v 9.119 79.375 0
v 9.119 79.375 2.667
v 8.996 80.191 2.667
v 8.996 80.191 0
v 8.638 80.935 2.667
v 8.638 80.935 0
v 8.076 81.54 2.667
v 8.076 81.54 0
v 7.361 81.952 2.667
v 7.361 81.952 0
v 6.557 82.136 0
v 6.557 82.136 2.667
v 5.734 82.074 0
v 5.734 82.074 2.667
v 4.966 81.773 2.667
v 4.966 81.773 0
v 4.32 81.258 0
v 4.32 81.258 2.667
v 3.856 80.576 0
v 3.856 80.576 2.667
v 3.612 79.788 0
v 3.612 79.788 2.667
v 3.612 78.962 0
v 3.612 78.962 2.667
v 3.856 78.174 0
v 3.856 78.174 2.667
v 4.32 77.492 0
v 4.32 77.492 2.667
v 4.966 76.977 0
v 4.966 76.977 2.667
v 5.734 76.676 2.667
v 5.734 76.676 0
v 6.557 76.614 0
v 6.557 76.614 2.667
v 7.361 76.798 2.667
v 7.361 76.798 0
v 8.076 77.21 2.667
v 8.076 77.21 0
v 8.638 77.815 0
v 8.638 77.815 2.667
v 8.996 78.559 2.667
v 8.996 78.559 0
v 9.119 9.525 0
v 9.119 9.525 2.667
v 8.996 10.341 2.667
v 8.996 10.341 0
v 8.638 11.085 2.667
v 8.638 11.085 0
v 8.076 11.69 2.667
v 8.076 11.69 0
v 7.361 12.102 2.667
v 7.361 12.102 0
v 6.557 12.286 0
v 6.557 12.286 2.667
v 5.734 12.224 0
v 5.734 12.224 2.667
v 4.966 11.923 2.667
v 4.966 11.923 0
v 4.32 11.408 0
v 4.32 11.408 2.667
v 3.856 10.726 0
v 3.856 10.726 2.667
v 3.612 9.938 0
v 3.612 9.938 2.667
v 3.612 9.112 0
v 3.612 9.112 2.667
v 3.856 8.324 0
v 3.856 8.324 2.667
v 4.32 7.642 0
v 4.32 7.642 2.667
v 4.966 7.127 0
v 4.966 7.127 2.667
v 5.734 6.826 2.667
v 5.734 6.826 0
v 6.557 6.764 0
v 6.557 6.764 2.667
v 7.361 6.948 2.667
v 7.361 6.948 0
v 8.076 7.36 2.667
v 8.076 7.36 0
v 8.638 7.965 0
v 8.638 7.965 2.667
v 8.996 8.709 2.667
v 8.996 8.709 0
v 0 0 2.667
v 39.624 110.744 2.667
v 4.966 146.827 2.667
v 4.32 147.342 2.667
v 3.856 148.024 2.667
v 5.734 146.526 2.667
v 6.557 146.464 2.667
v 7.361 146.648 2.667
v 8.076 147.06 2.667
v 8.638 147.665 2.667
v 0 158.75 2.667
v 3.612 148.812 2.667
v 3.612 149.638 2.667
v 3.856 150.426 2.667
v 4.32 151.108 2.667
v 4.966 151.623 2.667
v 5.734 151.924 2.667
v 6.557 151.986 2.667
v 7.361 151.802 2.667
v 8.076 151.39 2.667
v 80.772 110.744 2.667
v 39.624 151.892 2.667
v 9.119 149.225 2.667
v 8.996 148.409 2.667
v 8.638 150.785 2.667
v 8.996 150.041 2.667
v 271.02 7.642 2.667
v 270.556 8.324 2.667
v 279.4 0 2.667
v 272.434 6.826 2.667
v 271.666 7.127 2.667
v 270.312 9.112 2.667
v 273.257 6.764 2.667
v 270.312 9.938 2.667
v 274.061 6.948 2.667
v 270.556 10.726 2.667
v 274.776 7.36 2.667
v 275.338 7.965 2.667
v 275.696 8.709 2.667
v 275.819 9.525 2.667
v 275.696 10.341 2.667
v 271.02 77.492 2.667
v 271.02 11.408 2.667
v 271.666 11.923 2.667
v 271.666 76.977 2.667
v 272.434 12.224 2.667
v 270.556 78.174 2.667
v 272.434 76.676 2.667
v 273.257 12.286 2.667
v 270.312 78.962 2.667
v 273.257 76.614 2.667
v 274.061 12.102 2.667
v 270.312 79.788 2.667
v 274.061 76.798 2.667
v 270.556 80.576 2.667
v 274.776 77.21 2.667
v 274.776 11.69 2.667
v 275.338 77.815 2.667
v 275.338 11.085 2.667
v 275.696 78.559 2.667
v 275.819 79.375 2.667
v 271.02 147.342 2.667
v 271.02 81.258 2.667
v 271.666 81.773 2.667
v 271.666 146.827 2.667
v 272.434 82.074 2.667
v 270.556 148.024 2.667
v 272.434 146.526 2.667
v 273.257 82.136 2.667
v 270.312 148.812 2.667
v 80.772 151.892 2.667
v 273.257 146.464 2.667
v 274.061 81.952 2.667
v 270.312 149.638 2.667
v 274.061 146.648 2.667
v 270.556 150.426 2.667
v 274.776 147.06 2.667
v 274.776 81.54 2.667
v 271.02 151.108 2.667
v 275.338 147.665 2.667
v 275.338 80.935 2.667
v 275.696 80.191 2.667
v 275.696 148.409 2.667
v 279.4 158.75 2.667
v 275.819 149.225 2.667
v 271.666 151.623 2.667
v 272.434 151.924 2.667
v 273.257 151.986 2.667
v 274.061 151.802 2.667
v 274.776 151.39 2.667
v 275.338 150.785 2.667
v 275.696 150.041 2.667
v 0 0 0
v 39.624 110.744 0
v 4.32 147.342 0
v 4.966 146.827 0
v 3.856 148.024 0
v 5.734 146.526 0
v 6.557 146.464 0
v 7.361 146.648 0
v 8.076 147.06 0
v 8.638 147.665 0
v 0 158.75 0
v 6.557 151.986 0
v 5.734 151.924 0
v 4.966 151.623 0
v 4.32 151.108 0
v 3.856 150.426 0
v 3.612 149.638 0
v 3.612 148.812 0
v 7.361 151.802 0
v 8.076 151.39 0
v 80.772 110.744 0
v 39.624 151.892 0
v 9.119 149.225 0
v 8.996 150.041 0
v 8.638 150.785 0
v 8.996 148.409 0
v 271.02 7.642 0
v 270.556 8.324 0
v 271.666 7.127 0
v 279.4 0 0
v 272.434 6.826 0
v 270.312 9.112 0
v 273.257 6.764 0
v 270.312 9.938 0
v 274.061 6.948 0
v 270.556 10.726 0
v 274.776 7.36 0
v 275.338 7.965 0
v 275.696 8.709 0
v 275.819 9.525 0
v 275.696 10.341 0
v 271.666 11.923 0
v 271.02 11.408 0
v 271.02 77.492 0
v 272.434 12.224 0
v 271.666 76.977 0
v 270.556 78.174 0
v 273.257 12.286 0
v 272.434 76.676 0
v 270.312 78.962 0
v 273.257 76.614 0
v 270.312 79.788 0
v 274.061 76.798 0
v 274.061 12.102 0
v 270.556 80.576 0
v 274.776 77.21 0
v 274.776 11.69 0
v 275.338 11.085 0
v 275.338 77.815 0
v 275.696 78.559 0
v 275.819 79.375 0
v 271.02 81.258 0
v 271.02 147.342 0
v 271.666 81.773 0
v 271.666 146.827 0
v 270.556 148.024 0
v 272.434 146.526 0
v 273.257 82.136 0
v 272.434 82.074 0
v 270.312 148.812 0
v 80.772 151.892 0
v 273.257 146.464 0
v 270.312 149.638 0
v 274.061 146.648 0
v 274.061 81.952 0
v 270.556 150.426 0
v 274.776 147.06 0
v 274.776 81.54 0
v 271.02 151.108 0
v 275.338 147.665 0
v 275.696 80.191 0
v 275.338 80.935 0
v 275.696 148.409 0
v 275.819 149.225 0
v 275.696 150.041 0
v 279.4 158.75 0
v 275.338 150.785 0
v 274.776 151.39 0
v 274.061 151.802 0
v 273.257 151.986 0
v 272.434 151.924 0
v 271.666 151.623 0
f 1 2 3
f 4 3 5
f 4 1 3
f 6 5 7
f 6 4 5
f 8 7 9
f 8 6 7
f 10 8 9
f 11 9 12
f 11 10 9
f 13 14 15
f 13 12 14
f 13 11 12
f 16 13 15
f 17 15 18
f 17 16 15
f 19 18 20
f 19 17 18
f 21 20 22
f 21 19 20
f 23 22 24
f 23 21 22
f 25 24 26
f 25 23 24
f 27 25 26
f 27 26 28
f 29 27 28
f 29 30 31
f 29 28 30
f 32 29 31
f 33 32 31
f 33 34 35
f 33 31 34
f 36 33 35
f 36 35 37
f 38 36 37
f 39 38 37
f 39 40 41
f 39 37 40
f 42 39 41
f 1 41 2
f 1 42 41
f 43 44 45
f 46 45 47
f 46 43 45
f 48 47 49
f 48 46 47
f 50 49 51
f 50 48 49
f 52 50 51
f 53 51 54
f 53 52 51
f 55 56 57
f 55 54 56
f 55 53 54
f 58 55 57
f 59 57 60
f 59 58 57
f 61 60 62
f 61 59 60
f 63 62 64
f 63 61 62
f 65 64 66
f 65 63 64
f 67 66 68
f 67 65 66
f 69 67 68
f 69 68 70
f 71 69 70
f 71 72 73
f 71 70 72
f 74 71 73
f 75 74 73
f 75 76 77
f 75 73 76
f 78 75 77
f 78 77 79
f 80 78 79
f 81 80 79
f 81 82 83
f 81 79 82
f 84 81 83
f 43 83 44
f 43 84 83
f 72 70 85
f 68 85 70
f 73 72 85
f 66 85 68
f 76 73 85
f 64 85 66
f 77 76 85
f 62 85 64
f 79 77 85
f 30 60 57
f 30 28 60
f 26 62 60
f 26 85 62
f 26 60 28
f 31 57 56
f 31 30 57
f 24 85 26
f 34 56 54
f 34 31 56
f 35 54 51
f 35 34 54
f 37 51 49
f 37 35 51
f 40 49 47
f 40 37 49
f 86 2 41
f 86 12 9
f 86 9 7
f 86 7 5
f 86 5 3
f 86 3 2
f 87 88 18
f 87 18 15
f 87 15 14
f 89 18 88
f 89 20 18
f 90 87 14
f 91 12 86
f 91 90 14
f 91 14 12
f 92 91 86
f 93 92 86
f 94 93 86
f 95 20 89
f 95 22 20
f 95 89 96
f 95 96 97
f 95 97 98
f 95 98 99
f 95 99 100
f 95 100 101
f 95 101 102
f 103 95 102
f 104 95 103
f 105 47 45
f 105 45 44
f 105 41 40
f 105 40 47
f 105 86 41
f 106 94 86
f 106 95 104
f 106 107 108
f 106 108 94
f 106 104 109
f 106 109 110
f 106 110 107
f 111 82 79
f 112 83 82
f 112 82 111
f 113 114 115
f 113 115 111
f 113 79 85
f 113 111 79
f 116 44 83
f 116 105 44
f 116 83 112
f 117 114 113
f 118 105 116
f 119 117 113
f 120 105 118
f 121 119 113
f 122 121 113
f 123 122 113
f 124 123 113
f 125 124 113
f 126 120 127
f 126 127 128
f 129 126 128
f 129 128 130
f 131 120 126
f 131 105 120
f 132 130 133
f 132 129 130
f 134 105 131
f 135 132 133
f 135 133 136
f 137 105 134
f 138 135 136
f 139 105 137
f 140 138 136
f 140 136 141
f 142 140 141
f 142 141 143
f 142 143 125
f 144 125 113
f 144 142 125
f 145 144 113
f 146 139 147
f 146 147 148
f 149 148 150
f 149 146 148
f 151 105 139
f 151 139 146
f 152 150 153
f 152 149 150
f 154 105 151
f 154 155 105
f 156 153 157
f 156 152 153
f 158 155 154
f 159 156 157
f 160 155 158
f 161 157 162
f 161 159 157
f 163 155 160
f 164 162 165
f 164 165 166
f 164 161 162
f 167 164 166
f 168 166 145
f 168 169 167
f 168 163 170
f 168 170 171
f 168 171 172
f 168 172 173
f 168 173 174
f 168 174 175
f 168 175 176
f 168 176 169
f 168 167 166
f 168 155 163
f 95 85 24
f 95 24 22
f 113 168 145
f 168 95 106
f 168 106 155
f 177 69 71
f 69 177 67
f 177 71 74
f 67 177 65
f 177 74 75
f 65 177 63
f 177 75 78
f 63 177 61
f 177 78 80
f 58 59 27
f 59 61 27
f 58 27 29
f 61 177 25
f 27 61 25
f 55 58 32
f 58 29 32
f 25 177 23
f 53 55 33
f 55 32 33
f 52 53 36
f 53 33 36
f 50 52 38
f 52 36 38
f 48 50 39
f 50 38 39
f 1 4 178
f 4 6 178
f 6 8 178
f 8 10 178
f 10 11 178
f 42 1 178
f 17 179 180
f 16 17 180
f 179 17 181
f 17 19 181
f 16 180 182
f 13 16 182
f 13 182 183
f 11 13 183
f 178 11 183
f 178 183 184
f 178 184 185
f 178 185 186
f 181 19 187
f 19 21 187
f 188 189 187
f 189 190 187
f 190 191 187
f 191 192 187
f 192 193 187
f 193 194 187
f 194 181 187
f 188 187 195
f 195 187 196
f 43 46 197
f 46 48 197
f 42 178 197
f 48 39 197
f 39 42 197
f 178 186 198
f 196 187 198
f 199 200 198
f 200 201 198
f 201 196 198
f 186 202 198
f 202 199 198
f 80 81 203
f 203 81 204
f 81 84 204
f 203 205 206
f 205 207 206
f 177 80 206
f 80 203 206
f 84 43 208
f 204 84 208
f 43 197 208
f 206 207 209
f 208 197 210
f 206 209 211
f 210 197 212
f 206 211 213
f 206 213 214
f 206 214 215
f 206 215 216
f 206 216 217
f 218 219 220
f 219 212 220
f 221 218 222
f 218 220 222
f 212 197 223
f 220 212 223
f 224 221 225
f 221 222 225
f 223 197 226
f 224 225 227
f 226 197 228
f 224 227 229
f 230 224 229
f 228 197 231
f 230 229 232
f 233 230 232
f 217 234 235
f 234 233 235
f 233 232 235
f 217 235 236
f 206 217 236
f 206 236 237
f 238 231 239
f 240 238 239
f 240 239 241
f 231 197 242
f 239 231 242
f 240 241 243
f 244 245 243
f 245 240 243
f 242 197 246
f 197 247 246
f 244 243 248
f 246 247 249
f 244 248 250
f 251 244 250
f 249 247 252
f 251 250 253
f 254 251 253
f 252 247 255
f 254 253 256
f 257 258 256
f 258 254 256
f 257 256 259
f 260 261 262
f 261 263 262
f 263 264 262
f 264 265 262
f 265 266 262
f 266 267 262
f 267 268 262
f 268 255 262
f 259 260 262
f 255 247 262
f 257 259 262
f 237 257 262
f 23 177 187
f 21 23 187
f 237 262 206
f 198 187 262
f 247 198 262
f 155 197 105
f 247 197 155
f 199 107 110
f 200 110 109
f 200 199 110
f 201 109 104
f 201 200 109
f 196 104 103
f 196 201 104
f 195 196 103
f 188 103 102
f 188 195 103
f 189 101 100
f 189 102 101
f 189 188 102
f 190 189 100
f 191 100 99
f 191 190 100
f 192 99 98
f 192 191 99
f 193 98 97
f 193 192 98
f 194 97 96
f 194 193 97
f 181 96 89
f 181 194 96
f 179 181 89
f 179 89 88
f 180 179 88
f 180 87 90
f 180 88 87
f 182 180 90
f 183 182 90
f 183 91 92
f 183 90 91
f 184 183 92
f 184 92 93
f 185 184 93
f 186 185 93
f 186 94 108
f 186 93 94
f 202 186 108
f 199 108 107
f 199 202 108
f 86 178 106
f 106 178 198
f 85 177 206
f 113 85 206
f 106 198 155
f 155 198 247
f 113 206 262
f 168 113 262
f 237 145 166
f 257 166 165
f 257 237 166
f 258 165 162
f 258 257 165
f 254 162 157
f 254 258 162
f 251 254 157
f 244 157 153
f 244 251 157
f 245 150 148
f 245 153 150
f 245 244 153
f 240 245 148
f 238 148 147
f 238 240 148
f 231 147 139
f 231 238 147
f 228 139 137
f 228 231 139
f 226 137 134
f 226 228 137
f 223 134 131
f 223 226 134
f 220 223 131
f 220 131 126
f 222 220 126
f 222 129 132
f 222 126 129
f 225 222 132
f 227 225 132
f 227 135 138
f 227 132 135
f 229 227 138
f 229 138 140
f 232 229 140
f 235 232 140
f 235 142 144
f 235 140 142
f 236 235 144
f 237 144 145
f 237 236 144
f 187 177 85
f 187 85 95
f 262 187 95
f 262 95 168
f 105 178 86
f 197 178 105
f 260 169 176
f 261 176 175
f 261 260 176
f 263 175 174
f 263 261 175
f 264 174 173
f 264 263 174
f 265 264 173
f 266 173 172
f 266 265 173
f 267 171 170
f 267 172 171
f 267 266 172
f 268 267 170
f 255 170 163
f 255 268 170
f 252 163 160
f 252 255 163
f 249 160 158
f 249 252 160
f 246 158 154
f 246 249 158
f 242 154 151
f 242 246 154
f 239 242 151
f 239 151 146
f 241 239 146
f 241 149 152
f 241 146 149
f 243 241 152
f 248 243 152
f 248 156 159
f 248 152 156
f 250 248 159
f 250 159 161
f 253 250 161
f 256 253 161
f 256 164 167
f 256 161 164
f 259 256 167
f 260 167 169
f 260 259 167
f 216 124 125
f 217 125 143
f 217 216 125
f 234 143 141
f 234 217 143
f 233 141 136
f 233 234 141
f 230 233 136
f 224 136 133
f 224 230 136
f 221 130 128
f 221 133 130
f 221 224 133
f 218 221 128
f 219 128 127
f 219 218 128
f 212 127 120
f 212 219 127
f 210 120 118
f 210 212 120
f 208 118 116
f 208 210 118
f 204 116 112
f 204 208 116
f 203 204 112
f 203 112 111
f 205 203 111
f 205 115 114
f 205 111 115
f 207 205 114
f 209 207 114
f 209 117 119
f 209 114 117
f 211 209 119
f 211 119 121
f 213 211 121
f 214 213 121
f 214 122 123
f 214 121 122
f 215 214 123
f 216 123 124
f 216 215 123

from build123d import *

# Parameters (mm, degrees)
SKETCH1_W           = 279.4
SKETCH1_H           = 158.75
BOSS_EXTRUDE1_DEPTH = 2.667
SKETCH2_W           = 41.148
SKETCH2_H           = 41.148
CUT_EXTRUDE1_DEPTH  = 47.752
SKETCH3_R           = 2.7686
CUT_EXTRUDE2_DEPTH  = 322.361222597


with BuildPart() as part:
    # Sketch1 → Boss-Extrude1 (new body)
    with BuildSketch(Plane.XY):
        with Locations((139.7, 79.375)):
            Rectangle(SKETCH1_W, SKETCH1_H)
    extrude(amount=BOSS_EXTRUDE1_DEPTH)

    # Sketch2 → Cut-Extrude1 (cut)
    with BuildSketch(Plane.XY):
        with Locations((60.198, 131.318)):
            Rectangle(SKETCH2_W, SKETCH2_H)
    extrude(amount=CUT_EXTRUDE1_DEPTH, mode=Mode.SUBTRACT)

    # Sketch3 → Cut-Extrude2 (cut, through all)
    with BuildSketch(Plane.XY):
        with Locations((6.35, 9.525)):
            Circle(SKETCH3_R)
        with Locations((6.35, 79.375)):
            Circle(SKETCH3_R)
        with Locations((6.35, 149.225)):
            Circle(SKETCH3_R)
        with Locations((273.05, 9.525)):
            Circle(SKETCH3_R)
        with Locations((273.05, 79.375)):
            Circle(SKETCH3_R)
        with Locations((273.05, 149.225)):
            Circle(SKETCH3_R)
    extrude(amount=CUT_EXTRUDE2_DEPTH, mode=Mode.SUBTRACT)


solid = part.part
